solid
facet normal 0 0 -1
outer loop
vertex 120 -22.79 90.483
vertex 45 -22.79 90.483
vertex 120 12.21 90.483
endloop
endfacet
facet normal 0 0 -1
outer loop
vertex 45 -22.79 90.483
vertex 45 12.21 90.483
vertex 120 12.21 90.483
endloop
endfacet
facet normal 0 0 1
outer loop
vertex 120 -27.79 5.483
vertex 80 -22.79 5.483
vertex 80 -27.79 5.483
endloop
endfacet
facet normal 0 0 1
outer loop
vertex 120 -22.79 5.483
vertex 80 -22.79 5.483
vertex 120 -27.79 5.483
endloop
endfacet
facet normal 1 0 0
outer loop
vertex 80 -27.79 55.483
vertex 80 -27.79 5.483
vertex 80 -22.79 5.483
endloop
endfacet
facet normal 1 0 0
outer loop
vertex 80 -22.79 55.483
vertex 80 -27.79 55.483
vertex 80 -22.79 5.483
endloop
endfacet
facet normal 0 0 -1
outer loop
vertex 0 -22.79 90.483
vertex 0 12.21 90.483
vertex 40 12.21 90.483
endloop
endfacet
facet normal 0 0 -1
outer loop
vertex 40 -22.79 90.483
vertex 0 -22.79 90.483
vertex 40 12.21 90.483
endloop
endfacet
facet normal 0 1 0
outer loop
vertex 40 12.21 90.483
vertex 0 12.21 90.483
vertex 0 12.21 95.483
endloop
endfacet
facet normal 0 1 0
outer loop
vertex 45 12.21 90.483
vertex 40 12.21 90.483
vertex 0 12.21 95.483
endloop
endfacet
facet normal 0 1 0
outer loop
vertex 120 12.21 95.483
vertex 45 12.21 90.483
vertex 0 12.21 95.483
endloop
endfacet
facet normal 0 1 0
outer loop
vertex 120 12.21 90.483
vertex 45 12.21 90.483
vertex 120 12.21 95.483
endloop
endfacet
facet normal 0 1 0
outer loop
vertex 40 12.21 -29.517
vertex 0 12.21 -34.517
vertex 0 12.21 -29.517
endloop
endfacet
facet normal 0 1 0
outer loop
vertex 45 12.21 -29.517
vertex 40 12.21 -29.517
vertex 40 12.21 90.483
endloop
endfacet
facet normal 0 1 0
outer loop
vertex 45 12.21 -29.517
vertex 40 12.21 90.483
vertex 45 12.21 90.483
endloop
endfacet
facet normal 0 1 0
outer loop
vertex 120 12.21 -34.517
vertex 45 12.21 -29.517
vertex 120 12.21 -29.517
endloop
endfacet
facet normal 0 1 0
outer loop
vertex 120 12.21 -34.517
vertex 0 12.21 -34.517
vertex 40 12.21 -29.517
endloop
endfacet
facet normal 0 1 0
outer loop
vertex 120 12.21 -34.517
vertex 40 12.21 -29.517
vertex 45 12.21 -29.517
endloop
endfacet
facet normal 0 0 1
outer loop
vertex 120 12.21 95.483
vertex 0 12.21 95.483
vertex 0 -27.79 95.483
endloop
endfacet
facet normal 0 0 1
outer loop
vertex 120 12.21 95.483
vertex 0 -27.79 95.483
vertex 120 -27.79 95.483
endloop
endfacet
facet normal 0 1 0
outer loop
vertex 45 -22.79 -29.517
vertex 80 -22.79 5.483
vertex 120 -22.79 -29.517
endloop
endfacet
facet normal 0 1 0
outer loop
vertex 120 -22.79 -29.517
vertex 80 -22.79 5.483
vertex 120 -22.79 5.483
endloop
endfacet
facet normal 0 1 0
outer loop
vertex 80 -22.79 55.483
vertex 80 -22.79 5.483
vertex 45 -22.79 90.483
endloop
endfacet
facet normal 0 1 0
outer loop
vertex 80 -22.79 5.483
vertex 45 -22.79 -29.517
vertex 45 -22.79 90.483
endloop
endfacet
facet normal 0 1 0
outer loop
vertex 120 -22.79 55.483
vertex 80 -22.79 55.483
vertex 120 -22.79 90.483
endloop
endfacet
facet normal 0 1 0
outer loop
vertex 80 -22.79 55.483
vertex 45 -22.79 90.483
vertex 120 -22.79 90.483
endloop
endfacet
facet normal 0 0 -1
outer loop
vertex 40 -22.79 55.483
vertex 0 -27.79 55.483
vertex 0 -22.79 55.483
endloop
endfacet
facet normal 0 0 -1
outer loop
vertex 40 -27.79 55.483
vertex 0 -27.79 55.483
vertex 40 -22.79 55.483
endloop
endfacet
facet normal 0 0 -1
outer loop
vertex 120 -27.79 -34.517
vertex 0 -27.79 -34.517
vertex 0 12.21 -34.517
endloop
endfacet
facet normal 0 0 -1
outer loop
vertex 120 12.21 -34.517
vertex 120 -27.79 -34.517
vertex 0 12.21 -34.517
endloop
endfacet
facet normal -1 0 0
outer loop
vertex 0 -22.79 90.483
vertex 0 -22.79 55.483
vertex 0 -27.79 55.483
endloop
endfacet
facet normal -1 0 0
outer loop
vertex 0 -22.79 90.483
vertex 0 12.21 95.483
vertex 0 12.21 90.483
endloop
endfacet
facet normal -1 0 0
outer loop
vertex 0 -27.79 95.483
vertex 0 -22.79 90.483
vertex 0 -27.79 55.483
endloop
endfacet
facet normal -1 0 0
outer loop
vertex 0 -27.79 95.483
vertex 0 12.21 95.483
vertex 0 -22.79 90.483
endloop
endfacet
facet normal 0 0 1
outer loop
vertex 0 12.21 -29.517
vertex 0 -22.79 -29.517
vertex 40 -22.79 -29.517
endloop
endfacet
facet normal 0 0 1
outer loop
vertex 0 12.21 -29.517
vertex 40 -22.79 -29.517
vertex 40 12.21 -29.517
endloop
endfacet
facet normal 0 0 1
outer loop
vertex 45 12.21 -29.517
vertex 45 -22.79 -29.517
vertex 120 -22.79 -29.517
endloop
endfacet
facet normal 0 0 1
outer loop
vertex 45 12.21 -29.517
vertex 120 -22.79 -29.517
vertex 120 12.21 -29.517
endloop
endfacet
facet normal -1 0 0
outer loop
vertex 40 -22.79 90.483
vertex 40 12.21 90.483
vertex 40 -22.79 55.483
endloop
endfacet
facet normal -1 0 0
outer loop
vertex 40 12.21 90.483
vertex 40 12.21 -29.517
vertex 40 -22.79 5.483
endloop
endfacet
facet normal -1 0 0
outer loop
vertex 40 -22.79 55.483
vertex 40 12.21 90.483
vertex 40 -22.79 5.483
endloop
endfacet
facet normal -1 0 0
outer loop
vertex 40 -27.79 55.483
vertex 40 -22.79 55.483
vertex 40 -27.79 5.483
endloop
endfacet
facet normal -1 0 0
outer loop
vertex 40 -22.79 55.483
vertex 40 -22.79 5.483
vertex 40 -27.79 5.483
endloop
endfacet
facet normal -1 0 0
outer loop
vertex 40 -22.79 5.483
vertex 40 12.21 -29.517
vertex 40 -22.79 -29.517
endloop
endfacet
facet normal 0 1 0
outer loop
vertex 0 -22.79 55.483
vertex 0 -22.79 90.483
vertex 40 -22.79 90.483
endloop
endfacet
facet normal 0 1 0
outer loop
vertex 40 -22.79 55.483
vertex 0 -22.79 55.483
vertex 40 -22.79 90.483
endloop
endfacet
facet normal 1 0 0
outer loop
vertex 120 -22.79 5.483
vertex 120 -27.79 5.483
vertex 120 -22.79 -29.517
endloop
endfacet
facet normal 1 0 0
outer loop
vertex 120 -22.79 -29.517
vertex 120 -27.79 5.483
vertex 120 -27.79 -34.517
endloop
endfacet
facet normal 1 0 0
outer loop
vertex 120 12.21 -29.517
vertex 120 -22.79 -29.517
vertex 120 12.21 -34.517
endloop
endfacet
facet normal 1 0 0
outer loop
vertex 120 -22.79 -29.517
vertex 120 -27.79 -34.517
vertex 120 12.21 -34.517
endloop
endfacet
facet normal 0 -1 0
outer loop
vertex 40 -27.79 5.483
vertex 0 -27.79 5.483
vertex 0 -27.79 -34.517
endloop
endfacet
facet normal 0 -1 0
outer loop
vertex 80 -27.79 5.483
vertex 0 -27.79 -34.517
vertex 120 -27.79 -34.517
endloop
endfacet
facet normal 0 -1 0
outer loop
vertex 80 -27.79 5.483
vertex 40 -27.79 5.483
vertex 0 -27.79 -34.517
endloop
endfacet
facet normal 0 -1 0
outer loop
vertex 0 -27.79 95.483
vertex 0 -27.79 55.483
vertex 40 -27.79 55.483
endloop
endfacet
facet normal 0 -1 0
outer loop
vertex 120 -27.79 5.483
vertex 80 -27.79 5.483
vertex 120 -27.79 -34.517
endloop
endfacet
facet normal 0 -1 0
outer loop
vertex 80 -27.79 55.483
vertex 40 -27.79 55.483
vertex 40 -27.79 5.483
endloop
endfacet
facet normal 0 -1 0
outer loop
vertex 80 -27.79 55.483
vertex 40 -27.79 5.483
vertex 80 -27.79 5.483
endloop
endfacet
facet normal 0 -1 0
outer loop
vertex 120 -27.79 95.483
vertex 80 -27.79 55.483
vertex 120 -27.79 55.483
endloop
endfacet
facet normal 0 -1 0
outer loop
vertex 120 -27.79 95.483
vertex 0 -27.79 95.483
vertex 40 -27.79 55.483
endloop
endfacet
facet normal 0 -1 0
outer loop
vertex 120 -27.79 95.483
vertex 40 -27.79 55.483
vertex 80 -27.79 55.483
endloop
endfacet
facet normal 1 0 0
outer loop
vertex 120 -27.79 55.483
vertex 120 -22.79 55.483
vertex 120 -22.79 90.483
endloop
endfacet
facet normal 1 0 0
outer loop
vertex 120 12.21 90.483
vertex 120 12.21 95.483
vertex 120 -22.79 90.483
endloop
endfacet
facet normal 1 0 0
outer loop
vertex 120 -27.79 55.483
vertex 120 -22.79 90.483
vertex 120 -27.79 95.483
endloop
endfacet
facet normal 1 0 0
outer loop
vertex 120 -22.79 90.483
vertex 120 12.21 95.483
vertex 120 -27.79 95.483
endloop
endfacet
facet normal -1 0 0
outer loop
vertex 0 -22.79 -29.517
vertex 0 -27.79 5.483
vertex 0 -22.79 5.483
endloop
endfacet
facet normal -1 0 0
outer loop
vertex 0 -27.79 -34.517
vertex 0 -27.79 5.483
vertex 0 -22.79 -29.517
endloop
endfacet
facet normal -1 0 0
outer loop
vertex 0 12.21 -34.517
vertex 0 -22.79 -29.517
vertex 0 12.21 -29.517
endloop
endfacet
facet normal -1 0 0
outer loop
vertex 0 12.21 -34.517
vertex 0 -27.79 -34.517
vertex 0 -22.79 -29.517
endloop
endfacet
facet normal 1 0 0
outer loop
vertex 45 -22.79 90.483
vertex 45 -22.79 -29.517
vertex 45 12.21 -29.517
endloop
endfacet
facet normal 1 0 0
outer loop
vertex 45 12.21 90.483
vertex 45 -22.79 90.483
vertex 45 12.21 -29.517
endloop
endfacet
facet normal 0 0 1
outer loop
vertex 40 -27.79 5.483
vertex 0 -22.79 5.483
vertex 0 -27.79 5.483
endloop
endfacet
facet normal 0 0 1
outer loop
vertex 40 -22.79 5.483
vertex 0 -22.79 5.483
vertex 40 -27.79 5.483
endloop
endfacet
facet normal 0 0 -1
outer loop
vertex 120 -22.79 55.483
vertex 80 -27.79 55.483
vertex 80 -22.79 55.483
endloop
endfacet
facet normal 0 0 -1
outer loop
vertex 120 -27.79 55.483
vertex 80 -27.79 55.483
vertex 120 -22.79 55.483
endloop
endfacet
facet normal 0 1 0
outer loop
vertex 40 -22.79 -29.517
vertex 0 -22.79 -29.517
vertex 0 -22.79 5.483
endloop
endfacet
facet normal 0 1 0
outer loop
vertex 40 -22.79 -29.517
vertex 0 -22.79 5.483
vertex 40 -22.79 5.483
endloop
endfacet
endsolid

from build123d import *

# Parameters (mm, degrees)
F0_W      = 40
F0_H      = 5
F1_DEPTH  = 120
F2_W      = 20
F2_H      = 5
F3_DEPTH  = 120
F4_W      = 120
F4_H      = 40
F5_DEPTH  = 5
F6_W      = 40
F6_H      = 5
F7_DEPTH  = 35
F8_W      = 40
F8_H      = 5
F9_DEPTH  = 35
F10_W     = 40
F10_H     = 5
F11_DEPTH = 35
F12_W     = 40
F12_H     = 5
F13_DEPTH = 35


with BuildPart() as f1:
    # F0 (on Right) → F1 (new body)
    with BuildSketch(Plane.YZ):
        with Locations((-7.7903409343, -32.0171793364)):
            Rectangle(F0_W, F0_H)
    extrude(amount=F1_DEPTH)

    # F2 (on face) → F3 (join)
    with BuildSketch(Plane.XY.offset(-29.5171793364)):
        Polygon((45, 12.2096590657), (40, 12.2096590657), (40, -27.7903409343), (60, -27.7903409343), (60, -22.7903409343), (45, -22.7903409343), align=None)
        with Locations((70, -25.2903409343)):
            Rectangle(F2_W, F2_H)
    extrude(amount=F3_DEPTH)

    # F4 (on face) → F5 (join)
    with BuildSketch(Plane.XY.offset(90.4828206636)):
        with Locations((60, -7.7903409343)):
            Rectangle(F4_W, F4_H)
    extrude(amount=F5_DEPTH)

    # F6 (on face) → F7 (join)
    with BuildSketch(Plane.XY.offset(-29.5171793364)):
        with Locations((20, -25.2903409343)):
            Rectangle(F6_W, F6_H)
    extrude(amount=F7_DEPTH)

    # F8 (on face) → F9 (join)
    with BuildSketch(Plane.XY.offset(-29.5171793364)):
        with Locations((100, -25.2903409343)):
            Rectangle(F8_W, F8_H)
    extrude(amount=F9_DEPTH)

    # F10 (on face) → F11 (join)
    with BuildSketch(Plane(origin=(0, 0, 90.4828206636), x_dir=(1, 0, 0), z_dir=(0, 0, -1))):
        with Locations((20, 25.2903409343)):
            Rectangle(F10_W, F10_H)
    extrude(amount=F11_DEPTH)

    # F12 (on face) → F13 (join)
    with BuildSketch(Plane(origin=(0, 0, 90.4828206636), x_dir=(1, 0, 0), z_dir=(0, 0, -1))):
        with Locations((100, 25.2903409343)):
            Rectangle(F12_W, F12_H)
    extrude(amount=F13_DEPTH)


solid = f1.part
